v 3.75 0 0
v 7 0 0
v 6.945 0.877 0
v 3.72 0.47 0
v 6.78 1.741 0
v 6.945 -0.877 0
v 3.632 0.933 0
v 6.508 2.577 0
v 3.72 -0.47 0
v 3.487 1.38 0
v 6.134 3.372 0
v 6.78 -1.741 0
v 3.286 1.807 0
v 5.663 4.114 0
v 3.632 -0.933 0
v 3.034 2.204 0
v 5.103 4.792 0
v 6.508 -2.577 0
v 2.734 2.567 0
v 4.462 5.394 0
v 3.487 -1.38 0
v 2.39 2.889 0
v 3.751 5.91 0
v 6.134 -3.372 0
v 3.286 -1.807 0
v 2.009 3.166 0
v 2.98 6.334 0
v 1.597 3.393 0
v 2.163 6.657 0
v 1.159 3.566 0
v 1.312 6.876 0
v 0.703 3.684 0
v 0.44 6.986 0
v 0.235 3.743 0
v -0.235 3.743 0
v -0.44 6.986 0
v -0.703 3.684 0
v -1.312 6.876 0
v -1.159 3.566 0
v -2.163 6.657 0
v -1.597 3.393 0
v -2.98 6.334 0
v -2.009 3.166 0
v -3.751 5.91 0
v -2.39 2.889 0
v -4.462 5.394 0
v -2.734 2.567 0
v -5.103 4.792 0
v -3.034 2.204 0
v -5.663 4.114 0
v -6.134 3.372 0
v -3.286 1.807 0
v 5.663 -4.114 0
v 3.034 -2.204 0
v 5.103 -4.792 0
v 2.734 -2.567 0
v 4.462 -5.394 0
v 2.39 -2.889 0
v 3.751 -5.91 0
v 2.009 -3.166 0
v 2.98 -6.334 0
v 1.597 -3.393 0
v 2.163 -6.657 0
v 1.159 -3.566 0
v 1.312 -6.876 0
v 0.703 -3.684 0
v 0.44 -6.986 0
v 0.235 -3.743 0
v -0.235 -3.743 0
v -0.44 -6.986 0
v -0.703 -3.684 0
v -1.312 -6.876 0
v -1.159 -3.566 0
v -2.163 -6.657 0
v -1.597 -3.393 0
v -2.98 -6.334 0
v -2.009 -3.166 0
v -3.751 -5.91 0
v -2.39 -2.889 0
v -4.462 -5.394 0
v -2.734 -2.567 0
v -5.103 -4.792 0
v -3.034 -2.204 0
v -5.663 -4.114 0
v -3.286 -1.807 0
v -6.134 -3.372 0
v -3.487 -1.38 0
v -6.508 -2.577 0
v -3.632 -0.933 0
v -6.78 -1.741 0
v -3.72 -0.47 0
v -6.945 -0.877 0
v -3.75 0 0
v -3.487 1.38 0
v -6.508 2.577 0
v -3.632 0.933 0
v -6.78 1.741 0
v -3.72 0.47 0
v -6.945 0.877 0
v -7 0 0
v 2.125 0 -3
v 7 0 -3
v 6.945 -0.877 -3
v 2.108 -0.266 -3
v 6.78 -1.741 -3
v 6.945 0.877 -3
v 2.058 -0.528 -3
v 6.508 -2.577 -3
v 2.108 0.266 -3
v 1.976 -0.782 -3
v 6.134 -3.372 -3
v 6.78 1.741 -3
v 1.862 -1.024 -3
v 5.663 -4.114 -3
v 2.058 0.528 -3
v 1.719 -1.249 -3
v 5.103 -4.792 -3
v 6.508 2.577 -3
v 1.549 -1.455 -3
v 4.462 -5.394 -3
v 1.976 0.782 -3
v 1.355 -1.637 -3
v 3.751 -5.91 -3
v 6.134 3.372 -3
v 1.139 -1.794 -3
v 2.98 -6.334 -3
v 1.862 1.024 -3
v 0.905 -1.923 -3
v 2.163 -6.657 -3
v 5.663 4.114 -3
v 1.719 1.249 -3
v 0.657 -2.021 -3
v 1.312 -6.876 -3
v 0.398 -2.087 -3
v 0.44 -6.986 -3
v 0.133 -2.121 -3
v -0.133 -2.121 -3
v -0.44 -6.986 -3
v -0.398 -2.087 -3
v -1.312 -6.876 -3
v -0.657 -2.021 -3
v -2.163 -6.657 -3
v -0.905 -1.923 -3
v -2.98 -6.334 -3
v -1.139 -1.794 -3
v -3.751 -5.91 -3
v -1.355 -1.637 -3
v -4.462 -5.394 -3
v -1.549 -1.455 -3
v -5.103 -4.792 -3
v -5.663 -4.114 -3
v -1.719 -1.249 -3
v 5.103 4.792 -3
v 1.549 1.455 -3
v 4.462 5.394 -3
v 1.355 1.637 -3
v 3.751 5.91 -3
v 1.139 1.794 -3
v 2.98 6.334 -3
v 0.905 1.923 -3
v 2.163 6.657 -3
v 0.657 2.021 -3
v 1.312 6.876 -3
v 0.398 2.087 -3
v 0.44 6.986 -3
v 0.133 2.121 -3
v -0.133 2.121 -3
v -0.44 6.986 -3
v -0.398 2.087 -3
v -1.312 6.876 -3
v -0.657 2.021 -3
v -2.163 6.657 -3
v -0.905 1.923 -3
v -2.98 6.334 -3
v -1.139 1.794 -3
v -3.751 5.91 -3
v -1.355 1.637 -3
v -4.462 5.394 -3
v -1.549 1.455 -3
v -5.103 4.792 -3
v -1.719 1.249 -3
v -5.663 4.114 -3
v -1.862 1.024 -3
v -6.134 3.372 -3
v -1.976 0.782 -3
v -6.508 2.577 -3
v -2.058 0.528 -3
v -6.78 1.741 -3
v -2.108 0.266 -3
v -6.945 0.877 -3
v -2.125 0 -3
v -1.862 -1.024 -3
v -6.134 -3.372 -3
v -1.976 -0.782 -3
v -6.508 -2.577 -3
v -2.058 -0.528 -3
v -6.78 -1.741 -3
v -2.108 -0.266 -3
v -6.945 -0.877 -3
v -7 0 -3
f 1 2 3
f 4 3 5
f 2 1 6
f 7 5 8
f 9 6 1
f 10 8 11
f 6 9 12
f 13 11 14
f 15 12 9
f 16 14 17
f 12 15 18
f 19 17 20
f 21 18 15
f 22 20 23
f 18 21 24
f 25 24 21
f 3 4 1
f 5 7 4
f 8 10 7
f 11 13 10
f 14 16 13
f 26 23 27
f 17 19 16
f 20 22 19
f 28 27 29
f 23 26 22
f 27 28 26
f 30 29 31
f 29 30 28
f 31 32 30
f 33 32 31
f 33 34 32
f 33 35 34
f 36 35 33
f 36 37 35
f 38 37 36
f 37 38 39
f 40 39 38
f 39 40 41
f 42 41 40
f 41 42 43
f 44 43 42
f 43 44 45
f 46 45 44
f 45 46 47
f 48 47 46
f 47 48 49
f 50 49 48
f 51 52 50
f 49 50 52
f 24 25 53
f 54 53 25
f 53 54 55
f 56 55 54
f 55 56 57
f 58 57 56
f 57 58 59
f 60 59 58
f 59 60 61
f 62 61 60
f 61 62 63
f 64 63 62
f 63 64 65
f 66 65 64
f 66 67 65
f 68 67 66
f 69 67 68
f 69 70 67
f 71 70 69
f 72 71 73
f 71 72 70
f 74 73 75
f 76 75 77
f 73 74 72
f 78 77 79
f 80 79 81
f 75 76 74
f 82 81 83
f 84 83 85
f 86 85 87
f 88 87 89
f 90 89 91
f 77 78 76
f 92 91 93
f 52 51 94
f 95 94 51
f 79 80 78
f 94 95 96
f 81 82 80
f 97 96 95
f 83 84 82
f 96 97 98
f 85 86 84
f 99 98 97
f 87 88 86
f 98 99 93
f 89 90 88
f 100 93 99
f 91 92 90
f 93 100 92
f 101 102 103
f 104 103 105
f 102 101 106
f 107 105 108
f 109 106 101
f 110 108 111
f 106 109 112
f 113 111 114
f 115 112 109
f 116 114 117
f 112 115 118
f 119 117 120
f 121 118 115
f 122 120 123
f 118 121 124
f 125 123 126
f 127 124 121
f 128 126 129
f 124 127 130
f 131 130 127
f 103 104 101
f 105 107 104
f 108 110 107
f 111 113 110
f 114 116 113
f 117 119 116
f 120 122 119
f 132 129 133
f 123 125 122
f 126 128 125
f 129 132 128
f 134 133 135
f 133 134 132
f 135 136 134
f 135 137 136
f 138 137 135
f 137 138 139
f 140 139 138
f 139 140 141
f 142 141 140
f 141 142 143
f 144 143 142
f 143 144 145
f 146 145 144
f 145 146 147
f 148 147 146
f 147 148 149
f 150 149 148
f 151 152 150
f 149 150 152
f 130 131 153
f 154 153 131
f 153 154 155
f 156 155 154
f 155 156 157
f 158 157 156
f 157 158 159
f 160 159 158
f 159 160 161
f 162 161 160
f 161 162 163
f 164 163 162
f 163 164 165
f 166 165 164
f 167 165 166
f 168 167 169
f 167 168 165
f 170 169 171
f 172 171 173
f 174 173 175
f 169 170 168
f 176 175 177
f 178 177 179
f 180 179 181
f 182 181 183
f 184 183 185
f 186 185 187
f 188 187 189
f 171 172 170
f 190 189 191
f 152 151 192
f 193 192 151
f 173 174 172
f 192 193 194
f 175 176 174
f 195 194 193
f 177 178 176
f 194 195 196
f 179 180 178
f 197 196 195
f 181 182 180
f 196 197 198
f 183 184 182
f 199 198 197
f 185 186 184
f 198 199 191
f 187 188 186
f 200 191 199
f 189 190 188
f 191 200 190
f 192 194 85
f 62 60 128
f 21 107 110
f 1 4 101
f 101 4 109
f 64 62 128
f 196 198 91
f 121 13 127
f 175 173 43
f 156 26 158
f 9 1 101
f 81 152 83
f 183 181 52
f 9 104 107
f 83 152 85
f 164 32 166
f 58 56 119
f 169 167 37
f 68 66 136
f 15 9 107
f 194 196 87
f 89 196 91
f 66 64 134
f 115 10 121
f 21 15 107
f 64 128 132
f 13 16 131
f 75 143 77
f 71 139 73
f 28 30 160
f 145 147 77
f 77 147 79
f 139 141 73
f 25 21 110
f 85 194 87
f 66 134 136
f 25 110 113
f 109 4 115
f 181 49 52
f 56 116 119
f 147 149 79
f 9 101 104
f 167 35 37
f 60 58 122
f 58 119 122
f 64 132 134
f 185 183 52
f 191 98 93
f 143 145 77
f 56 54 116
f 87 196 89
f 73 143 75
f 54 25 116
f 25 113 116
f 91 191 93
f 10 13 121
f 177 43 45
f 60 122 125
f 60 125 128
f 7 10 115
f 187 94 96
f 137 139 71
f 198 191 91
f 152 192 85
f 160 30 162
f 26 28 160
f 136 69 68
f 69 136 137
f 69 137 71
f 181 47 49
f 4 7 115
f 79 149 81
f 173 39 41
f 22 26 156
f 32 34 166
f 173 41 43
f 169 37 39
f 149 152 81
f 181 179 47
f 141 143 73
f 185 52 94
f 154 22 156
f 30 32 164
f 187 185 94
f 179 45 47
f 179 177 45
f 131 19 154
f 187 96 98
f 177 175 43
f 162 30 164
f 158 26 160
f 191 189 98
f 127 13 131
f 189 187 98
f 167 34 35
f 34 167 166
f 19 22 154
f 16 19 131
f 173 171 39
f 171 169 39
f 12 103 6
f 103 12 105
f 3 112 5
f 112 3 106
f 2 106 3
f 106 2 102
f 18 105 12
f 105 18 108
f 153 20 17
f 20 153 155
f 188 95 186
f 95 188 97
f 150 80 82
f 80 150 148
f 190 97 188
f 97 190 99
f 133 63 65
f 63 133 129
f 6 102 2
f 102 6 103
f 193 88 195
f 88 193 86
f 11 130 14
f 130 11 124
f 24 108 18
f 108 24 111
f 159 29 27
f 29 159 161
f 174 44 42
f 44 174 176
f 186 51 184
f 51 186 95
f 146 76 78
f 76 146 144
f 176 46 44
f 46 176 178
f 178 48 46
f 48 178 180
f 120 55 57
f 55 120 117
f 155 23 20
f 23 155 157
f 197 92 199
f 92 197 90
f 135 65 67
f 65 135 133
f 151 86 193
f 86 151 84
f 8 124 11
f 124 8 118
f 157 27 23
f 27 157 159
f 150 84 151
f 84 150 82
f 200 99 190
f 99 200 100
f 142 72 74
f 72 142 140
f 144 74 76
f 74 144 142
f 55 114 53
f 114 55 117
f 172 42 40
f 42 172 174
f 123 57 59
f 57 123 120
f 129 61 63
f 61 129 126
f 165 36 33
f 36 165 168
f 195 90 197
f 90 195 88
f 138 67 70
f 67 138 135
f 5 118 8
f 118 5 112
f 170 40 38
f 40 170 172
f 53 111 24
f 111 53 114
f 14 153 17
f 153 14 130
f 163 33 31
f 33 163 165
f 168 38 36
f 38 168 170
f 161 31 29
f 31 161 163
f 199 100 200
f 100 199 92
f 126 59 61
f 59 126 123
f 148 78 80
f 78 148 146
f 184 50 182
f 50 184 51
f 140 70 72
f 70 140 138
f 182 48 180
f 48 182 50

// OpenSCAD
$fn = 50;


difference() {
	union() {
		translate(v = [0, 0, -3.0000000000]) {
			cylinder(h = 3, r = 7.0000000000);
		}
		cylinder(h = 0, r = 16.0000000000);
	}
	union() {
		translate(v = [0, 0, 0]) {
			rotate(a = [0, 0, 0]) {
				difference() {
					union() {
						#translate(v = [0, 0, -3.0000000000]) {
							cylinder(h = 3, r = 2.0000000000);
						}
						#translate(v = [0, 0, -3]) {
							cylinder(h = 3, r1 = 2.1250000000, r2 = 3.7500000000);
						}
						#translate(v = [0, 0, -3.0000000000]) {
							cylinder(h = 3, r = 2.1250000000);
						}
						#translate(v = [0, 0, -3.0000000000]) {
							cylinder(h = 3, r = 2.0000000000);
						}
					}
					union();
				}
			}
		}
	}
}
